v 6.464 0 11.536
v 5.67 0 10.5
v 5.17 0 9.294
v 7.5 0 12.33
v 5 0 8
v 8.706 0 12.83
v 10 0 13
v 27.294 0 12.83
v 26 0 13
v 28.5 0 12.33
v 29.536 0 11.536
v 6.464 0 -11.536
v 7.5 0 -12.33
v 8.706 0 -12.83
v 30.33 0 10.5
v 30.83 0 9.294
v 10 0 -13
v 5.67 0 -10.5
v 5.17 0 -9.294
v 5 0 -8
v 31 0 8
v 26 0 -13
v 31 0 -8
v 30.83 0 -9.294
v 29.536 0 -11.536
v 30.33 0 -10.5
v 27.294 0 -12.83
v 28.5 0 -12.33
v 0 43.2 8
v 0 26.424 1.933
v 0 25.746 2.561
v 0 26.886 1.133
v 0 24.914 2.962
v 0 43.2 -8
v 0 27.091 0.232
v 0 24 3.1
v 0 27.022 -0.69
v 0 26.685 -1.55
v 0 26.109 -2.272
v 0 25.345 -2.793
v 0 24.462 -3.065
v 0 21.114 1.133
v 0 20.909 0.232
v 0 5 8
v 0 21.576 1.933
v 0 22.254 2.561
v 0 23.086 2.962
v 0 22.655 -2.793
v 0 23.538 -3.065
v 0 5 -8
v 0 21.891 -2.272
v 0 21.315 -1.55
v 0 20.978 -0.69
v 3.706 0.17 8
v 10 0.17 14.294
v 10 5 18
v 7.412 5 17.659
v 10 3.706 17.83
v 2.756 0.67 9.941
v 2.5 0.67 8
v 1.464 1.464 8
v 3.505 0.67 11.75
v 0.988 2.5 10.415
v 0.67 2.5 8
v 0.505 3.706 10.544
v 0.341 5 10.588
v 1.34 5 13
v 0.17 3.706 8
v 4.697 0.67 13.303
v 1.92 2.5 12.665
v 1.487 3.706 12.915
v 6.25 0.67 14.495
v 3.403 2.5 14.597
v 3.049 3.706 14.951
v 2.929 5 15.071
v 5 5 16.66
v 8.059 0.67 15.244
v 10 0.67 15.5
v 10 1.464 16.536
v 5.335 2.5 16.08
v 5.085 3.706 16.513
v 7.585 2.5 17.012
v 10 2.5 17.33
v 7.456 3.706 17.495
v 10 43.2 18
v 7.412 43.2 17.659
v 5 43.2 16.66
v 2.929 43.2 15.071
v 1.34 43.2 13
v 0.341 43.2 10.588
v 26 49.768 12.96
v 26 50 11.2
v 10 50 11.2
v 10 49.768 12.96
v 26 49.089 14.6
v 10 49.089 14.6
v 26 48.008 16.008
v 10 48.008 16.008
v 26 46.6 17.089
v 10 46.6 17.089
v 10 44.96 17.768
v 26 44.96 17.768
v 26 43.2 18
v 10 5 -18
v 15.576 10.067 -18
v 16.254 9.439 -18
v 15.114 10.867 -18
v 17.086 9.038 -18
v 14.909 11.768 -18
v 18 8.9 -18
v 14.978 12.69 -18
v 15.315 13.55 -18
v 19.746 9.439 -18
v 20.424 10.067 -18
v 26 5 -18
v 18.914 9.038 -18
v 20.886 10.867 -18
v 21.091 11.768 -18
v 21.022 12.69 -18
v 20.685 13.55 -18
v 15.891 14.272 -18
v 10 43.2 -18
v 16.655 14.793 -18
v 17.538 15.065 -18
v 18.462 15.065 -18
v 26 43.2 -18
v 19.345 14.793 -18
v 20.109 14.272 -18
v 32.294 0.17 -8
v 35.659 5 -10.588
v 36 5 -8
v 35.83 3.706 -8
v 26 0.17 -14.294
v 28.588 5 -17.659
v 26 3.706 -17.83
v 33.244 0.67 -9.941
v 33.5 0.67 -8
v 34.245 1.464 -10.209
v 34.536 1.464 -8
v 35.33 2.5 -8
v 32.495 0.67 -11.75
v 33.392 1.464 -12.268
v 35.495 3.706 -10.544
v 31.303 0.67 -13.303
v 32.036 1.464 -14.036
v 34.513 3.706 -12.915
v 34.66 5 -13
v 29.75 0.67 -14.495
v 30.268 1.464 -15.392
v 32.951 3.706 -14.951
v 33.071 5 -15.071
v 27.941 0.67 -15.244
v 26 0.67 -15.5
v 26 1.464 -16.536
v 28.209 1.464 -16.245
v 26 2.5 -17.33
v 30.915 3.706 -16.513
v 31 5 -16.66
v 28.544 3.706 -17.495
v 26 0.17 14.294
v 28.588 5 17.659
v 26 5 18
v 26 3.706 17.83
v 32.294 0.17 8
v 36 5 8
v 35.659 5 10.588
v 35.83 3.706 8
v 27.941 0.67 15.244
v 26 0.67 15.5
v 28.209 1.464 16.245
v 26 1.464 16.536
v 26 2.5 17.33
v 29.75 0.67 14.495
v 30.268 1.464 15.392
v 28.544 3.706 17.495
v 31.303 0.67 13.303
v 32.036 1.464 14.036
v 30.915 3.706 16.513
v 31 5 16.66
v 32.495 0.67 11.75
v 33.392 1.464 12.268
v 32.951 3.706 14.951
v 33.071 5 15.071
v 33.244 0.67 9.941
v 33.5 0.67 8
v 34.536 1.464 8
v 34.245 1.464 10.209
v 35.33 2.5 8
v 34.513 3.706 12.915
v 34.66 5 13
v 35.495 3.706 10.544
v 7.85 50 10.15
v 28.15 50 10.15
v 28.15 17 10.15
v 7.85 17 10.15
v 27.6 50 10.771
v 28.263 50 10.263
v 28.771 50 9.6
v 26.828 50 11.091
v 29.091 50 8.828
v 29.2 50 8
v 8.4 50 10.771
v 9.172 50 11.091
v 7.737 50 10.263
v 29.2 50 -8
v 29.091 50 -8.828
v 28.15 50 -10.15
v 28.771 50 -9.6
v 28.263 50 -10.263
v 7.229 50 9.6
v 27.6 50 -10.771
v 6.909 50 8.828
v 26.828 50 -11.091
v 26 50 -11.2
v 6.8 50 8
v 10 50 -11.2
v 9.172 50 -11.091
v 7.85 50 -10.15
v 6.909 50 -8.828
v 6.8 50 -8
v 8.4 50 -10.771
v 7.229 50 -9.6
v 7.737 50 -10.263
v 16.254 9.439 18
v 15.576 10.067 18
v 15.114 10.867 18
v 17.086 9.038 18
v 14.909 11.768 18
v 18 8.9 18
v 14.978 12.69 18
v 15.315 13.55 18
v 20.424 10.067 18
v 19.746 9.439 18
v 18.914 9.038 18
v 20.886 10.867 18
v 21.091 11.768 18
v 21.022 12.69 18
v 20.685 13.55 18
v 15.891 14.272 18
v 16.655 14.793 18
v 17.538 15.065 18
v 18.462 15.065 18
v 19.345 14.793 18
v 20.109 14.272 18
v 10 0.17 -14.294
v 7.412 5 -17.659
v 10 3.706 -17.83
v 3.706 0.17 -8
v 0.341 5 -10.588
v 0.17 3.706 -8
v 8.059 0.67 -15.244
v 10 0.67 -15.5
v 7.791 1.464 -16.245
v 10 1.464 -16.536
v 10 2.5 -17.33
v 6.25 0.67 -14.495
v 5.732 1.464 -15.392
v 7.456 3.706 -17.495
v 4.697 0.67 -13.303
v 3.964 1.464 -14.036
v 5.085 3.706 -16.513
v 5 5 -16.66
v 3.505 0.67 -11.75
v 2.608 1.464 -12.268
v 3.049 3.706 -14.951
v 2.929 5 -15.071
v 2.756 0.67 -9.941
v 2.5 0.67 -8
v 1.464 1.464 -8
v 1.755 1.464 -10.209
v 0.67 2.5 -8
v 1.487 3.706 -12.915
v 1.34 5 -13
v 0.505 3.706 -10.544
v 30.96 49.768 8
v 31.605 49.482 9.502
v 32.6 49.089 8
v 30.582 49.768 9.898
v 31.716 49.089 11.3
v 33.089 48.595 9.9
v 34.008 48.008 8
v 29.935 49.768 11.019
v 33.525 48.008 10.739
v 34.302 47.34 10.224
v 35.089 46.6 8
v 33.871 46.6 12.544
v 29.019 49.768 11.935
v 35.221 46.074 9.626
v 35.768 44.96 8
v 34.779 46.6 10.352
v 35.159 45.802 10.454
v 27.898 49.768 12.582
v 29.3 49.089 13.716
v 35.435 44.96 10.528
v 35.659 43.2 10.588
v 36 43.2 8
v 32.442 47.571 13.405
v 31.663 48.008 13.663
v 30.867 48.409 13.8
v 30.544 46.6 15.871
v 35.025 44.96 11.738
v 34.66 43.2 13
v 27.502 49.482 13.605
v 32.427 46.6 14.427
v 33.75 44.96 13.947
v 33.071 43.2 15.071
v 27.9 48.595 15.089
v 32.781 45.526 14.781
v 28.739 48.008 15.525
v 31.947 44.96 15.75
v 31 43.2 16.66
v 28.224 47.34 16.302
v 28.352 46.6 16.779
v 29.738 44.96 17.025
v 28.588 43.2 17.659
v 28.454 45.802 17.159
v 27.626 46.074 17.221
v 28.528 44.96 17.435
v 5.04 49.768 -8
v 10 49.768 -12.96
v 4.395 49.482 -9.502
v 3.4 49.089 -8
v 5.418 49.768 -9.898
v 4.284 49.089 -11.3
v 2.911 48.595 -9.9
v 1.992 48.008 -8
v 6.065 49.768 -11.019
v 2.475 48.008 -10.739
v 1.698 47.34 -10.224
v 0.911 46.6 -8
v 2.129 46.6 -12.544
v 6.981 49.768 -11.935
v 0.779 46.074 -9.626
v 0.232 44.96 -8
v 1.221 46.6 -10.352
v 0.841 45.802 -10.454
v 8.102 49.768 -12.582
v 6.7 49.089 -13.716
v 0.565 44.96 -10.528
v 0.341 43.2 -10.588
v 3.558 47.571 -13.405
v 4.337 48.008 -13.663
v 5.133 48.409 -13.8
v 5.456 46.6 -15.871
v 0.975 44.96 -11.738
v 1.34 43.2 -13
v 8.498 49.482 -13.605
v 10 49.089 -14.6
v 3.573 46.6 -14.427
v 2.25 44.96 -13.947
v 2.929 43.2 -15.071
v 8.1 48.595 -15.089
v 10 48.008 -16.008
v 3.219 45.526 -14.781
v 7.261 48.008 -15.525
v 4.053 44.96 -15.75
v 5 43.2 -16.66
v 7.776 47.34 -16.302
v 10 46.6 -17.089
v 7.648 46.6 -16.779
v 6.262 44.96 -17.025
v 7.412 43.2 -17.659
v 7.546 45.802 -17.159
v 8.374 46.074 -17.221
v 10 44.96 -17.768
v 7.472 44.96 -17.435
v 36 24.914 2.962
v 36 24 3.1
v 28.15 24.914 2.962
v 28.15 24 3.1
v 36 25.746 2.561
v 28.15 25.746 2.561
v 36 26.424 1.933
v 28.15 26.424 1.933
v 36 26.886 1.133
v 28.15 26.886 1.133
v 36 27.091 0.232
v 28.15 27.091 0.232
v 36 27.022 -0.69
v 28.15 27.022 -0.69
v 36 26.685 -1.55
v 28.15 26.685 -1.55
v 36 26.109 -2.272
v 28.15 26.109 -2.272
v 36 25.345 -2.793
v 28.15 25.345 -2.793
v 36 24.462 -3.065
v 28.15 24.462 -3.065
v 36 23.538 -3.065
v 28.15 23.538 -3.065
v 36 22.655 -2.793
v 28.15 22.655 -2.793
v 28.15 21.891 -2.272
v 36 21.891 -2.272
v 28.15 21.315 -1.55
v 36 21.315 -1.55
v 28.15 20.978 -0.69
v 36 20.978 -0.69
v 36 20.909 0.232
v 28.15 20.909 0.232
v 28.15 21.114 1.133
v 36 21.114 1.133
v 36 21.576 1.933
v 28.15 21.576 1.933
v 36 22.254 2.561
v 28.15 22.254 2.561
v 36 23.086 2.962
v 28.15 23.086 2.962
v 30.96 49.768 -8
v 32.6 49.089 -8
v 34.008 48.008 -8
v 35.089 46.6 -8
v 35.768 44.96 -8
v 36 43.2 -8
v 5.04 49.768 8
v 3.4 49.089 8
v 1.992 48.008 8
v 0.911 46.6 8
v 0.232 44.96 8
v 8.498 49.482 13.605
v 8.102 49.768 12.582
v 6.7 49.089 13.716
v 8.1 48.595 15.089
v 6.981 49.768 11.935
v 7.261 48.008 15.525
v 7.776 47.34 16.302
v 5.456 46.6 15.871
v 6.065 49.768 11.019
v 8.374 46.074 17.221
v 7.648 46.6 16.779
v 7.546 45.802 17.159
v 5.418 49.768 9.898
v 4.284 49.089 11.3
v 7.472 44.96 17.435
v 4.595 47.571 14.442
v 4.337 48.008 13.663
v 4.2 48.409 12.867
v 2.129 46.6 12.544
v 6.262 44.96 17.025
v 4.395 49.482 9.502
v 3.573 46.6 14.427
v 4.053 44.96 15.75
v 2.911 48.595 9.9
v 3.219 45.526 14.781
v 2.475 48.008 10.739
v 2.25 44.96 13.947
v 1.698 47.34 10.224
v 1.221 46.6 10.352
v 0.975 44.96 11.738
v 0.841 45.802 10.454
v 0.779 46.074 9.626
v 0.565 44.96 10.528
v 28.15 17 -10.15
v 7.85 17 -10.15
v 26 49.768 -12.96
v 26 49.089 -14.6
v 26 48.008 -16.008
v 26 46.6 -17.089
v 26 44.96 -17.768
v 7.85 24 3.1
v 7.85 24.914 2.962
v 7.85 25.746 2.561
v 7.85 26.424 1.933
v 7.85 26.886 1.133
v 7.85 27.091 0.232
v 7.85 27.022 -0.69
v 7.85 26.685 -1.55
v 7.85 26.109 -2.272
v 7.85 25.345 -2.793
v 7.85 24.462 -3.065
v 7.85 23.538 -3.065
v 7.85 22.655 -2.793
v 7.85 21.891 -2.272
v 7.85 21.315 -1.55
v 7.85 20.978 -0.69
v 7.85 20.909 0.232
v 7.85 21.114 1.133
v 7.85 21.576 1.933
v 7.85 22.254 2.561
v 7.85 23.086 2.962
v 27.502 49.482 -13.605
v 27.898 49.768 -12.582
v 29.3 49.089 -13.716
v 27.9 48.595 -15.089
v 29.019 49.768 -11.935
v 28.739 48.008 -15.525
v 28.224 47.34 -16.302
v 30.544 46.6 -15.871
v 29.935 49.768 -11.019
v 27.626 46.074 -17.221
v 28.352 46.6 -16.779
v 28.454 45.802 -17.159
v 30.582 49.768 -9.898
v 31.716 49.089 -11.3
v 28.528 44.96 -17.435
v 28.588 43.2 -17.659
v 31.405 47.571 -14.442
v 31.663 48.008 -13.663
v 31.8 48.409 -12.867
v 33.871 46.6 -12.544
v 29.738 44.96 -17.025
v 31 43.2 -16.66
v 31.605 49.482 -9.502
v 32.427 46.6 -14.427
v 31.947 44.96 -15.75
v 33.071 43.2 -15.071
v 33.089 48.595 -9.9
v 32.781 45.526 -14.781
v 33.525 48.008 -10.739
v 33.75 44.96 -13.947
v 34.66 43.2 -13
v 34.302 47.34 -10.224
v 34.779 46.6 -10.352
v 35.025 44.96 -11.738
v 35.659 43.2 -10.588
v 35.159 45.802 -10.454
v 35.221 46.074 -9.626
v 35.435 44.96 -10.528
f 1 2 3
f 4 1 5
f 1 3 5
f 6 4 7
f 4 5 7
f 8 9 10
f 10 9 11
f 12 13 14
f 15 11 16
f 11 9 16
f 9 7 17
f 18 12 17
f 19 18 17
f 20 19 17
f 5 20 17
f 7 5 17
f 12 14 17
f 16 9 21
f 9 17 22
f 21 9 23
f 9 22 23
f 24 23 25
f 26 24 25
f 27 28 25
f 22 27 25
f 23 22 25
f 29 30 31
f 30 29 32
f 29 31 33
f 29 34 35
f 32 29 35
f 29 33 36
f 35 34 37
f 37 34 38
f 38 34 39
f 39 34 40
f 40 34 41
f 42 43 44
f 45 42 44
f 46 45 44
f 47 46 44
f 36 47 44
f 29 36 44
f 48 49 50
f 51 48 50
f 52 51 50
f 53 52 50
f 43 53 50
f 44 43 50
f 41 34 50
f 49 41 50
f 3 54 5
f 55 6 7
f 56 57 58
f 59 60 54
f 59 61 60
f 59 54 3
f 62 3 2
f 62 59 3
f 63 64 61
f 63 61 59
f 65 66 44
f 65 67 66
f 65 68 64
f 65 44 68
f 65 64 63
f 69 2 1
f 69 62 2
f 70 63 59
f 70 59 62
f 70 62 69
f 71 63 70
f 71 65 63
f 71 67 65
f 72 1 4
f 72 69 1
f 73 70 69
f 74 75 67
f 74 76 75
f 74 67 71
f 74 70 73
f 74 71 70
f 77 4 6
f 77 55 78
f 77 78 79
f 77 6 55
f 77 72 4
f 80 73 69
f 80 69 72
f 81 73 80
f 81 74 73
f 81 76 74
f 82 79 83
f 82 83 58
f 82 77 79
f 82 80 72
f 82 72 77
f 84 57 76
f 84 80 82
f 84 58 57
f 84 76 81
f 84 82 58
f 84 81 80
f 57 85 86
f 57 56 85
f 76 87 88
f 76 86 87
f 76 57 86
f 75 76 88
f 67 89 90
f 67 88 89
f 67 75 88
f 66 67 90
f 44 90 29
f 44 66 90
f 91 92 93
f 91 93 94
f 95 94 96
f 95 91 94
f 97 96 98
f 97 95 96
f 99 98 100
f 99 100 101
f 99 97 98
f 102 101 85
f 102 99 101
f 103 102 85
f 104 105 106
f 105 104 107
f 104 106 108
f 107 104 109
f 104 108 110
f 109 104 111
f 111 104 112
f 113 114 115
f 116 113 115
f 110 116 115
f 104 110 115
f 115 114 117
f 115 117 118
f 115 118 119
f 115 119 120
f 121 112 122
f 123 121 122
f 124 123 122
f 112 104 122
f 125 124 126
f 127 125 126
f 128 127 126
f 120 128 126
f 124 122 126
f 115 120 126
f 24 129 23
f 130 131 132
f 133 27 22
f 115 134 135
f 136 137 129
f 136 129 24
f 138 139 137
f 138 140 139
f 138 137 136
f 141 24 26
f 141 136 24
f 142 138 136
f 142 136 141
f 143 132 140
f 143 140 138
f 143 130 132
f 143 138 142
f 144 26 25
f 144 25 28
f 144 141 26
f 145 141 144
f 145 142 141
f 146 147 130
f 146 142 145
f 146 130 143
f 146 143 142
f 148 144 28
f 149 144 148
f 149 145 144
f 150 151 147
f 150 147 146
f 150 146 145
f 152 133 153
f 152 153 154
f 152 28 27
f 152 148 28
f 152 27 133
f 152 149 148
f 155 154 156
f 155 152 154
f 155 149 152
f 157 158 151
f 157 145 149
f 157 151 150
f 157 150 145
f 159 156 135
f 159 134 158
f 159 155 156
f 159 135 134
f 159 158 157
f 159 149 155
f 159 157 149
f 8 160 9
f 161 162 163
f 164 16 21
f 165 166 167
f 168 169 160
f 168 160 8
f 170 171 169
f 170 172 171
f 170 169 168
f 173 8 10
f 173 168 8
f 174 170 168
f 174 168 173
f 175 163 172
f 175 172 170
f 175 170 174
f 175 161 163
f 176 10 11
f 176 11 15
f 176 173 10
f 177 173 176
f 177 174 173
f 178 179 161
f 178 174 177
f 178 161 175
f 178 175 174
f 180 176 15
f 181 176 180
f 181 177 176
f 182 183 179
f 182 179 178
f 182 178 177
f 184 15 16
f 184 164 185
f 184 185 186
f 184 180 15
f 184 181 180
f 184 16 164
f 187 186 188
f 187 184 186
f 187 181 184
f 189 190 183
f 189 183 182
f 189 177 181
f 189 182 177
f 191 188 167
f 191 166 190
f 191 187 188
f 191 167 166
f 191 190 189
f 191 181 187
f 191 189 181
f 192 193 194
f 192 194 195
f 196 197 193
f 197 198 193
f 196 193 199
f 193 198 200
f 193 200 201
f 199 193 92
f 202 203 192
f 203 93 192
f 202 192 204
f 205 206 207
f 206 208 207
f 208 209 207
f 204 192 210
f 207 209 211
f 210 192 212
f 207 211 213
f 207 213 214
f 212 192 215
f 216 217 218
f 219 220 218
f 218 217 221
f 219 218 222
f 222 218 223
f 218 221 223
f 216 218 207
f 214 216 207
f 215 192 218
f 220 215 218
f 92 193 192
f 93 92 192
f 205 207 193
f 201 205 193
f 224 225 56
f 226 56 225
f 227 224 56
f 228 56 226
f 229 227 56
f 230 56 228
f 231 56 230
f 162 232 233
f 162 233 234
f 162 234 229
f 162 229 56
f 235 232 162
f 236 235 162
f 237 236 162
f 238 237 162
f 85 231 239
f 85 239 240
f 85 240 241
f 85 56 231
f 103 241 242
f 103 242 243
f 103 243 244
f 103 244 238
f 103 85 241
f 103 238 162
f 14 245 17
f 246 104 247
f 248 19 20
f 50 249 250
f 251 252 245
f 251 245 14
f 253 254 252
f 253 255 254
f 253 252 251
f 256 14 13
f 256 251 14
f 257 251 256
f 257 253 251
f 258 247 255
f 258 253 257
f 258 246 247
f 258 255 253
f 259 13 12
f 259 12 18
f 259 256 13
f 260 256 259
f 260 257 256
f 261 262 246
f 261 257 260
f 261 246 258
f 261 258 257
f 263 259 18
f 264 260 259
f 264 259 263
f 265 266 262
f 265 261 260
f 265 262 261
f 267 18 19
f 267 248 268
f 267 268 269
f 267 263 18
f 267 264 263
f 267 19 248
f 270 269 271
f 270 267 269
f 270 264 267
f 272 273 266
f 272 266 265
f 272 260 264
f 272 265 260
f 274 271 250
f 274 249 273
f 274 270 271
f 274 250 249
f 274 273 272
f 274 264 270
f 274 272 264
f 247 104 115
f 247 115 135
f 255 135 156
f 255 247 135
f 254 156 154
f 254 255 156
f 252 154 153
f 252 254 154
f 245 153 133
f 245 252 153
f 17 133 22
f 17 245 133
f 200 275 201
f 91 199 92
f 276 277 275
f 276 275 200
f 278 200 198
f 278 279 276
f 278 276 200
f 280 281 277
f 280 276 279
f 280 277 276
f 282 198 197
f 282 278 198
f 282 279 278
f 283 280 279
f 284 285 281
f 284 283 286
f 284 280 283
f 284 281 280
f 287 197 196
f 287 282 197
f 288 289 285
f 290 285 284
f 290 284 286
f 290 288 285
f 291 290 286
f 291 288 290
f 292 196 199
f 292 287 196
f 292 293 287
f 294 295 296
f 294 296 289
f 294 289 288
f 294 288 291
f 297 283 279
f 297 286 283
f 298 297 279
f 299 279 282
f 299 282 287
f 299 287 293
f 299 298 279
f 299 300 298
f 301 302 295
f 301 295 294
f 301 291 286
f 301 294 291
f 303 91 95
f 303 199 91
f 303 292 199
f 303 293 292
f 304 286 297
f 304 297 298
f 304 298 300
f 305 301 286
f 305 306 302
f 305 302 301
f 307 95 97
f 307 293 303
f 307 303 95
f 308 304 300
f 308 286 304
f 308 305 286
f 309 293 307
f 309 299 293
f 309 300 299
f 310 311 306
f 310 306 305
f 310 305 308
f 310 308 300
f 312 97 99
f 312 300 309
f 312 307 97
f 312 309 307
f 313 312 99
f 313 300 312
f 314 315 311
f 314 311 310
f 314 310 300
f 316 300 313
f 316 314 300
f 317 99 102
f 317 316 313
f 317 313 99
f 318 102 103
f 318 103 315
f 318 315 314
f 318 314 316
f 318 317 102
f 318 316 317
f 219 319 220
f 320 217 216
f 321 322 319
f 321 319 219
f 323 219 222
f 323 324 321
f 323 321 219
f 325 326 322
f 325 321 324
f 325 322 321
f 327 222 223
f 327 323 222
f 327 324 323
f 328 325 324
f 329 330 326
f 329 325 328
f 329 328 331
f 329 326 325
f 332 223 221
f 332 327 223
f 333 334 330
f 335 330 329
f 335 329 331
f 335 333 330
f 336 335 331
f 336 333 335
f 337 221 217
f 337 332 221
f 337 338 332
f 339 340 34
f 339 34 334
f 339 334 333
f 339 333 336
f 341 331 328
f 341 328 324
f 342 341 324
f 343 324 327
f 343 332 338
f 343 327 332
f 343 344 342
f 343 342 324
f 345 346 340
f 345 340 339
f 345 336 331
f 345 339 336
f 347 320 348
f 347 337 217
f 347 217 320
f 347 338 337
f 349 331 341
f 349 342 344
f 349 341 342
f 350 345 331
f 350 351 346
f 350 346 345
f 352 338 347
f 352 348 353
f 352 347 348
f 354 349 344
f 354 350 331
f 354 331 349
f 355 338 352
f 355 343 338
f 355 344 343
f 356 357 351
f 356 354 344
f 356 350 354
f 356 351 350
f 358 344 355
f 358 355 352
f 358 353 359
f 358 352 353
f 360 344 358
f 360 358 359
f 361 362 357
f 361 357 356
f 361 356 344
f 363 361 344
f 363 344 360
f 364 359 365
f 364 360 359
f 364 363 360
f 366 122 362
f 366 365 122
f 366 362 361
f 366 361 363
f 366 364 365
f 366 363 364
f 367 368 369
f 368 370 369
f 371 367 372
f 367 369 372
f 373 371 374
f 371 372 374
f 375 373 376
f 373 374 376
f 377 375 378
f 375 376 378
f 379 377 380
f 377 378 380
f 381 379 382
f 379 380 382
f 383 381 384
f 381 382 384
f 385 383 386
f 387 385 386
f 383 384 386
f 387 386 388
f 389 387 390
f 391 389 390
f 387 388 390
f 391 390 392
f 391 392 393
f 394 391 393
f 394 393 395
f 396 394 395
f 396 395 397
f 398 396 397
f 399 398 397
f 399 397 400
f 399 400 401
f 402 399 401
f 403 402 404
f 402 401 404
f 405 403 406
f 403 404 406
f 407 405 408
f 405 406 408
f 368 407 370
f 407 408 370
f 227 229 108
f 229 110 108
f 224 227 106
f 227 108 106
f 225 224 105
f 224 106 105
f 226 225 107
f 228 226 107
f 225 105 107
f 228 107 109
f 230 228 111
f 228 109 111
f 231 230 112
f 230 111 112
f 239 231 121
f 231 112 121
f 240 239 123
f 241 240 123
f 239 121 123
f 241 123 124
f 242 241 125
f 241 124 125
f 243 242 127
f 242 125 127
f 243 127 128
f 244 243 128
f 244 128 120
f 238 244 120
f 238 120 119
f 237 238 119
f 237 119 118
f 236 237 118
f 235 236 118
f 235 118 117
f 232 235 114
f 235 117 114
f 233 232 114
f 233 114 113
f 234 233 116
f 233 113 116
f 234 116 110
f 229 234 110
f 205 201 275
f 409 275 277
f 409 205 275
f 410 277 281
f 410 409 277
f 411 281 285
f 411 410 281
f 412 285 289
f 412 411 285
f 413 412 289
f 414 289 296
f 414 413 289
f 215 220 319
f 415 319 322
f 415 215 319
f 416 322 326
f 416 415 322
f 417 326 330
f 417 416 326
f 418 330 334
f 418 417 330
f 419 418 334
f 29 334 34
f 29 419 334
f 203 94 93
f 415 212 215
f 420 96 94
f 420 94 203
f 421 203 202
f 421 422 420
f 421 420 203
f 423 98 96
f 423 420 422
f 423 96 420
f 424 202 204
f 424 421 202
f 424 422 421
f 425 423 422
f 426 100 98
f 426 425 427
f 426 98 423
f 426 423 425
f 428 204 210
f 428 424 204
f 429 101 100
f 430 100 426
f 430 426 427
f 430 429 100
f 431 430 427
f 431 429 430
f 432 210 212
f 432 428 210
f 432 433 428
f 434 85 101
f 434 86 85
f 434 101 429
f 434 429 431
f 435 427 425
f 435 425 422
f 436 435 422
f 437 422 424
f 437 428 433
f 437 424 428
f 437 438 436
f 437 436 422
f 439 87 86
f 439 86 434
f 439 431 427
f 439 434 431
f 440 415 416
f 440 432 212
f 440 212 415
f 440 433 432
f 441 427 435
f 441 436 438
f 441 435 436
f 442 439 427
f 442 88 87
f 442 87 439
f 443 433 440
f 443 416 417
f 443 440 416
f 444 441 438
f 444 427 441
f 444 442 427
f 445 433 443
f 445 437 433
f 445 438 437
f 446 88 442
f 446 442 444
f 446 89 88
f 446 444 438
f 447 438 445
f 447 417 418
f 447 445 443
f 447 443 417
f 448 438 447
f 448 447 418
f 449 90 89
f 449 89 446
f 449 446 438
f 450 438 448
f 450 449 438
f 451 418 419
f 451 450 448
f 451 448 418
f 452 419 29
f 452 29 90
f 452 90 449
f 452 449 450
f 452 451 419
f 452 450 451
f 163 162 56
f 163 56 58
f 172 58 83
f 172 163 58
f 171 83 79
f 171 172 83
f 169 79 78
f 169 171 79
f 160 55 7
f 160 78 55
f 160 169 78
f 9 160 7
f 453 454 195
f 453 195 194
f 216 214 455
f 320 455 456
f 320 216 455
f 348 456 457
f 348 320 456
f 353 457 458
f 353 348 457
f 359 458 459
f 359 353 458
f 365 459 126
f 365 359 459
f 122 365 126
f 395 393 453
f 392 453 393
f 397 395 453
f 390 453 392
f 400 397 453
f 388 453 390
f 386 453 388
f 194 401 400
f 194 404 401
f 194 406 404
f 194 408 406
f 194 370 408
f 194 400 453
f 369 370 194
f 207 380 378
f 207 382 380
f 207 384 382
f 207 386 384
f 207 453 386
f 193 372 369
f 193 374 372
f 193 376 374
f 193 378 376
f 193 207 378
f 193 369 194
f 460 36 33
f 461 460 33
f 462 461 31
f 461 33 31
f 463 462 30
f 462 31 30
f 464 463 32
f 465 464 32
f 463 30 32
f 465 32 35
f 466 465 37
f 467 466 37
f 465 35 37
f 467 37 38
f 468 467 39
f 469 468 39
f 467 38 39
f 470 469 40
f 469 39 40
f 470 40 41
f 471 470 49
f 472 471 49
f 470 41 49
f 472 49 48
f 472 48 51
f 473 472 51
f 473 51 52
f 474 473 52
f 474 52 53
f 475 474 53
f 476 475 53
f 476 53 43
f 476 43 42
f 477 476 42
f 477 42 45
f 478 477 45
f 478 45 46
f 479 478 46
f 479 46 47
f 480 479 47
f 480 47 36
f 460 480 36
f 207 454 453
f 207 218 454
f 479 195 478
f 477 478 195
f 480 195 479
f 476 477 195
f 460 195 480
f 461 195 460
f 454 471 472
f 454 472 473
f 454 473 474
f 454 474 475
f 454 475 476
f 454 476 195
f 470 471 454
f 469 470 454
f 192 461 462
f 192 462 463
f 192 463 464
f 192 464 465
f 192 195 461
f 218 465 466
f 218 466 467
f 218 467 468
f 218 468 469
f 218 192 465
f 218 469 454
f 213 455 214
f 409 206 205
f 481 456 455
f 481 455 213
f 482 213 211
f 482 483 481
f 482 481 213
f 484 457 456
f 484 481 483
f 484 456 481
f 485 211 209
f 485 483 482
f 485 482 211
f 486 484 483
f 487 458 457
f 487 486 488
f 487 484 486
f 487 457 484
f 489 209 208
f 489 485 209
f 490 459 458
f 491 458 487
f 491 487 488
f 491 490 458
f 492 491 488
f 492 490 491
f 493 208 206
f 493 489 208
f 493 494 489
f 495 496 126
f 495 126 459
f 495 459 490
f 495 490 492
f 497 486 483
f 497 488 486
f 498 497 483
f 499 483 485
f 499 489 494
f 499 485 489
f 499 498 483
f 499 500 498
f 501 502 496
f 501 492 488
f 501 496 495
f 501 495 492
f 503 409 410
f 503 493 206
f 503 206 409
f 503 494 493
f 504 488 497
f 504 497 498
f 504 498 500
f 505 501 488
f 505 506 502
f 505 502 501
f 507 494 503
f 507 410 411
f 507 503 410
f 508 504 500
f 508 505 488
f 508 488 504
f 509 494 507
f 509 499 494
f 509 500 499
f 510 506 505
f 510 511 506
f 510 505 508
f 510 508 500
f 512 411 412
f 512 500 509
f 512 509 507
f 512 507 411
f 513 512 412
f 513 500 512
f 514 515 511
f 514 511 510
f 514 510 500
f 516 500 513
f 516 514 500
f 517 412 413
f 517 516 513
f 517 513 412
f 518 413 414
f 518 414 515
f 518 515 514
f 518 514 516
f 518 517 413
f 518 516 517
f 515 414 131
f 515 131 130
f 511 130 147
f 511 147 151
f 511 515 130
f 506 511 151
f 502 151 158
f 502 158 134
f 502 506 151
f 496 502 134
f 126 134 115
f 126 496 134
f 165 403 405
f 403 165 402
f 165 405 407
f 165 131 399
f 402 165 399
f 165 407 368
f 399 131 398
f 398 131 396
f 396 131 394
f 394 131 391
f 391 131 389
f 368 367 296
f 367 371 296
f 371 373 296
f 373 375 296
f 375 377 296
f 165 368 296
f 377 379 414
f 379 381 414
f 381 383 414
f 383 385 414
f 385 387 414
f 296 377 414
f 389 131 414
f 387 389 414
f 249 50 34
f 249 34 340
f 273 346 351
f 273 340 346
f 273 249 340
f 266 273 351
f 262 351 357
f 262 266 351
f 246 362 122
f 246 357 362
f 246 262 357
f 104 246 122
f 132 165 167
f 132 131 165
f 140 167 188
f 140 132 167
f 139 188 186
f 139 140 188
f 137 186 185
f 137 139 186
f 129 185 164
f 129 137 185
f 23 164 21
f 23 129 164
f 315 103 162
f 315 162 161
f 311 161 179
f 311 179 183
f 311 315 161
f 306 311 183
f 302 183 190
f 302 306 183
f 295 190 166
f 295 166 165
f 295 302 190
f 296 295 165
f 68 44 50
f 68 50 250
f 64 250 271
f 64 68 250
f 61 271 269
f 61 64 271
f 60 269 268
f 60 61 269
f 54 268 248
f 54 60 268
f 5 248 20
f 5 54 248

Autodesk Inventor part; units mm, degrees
ref_plane "YZ Plane" through (0, 0, 0) normal (1, 0, 0) x (0, 1, 0)
ref_plane "XZ Plane" through (0, 0, 0) normal (0, 1, 0) x (-1, 0, 0)
ref_plane "XY Plane" through (0, 0, 0) normal (0, 0, 1) x (1, 0, 0)
sketch "Sketch1" plane through (0, 0, 0) normal (0, 0, 1) x (1, 0, 0)
  line L0 (0, 0) -> (36, 0)
  line L1 (36, 0) -> (36, 50)
  line L2 (36, 50) -> (0, 50)
  line L3 (0, 50) -> (0, 0)
  dimension "d0" = 36
  dimension "d1" = 50
extrude "Extrusion1" add sketch "Sketch1" along normal mid plane 36
sketch "Sketch2" plane through (0, 50, 18) normal (0, 1, 0) x (1, 0, 0)
  line L0 (28.15, 7.85) -> (7.85, 7.85)
  line L1 (7.85, 7.85) -> (7.85, 28.15)
  line L2 (7.85, 28.15) -> (28.15, 28.15)
  line L3 (28.15, 28.15) -> (28.15, 7.85)
  line L4 (28.15, 7.85) -> (7.85, 28.15) construction
  line L5 (7.85, 7.85) -> (28.15, 28.15) construction
  line L6 (0, 36) -> (0, 0) projected
  point P0 (0, 18)
  point P1 (18, 18)
  point P2 (0, 18)
  dimension "d4" = 18
  dimension "d5" = 20.3
  dimension "d6" = 20.3
extrude "Extrusion2" cut sketch "Sketch2" against normal blind 33
sketch "Sketch3" plane through (0, 0, 18) normal (0, 0, 1) x (1, 0, 0)
  line L0 (0, 50) -> (0, 0) projected
  line L1 (0, 0) -> (36, 0) projected
  point P0 (18, 12)
  dimension "d9" = 18
  dimension "d10" = 12
hole "Hole1" at (18, 12, 18) direction (0, 0, -1) diameter 6.2 end through all
sketch "Sketch8" plane through (7.85, 50, -10.15) normal (0, 0, 1) x (1, 0, 0)
  point P0 (-7.85, -50)
sketch "Sketch11" plane through (0, 0, 18) normal (-1, 0, 0) x (0, 0, 1)
  circle A0 centre (-18, 24) radius 3.1
  line L0 (0, 50) -> (0, 0) projected
  line L1 (-7.85, 17) -> (-28.15, 17) projected
  point P0 (-18, 0)
  dimension "d41" = 6.2
  dimension "d42" = 18
  dimension "d43" = 7
extrude "Extrusion6" cut sketch "Sketch11" against normal through all
fillet "Fillet1" radius 10 4 edges at (36, 25, 18) (0, 25, 18) (0, 25, -18) (36, 25, -18)
fillet "Fillet2" radius 5 8 edges at (18, 0, 18) (33.0711, 0, 15.0711) (36, 0, 0) (33.0711, 0, -15.0711) (18, 0, -18) (2.9289, 0, -15.0711) (0, 0, 0) (2.9289, 0, 15.0711)
fillet "Fillet3" radius 6.8 8 edges at (33.0711, 50, 15.0711) (18, 50, 18) (2.9289, 50, 15.0711) (0, 50, 0) (2.9289, 50, -15.0711) (18, 50, -18) (33.0711, 50, -15.0711) (36, 50, 0)
properties part number "arm_collar"
